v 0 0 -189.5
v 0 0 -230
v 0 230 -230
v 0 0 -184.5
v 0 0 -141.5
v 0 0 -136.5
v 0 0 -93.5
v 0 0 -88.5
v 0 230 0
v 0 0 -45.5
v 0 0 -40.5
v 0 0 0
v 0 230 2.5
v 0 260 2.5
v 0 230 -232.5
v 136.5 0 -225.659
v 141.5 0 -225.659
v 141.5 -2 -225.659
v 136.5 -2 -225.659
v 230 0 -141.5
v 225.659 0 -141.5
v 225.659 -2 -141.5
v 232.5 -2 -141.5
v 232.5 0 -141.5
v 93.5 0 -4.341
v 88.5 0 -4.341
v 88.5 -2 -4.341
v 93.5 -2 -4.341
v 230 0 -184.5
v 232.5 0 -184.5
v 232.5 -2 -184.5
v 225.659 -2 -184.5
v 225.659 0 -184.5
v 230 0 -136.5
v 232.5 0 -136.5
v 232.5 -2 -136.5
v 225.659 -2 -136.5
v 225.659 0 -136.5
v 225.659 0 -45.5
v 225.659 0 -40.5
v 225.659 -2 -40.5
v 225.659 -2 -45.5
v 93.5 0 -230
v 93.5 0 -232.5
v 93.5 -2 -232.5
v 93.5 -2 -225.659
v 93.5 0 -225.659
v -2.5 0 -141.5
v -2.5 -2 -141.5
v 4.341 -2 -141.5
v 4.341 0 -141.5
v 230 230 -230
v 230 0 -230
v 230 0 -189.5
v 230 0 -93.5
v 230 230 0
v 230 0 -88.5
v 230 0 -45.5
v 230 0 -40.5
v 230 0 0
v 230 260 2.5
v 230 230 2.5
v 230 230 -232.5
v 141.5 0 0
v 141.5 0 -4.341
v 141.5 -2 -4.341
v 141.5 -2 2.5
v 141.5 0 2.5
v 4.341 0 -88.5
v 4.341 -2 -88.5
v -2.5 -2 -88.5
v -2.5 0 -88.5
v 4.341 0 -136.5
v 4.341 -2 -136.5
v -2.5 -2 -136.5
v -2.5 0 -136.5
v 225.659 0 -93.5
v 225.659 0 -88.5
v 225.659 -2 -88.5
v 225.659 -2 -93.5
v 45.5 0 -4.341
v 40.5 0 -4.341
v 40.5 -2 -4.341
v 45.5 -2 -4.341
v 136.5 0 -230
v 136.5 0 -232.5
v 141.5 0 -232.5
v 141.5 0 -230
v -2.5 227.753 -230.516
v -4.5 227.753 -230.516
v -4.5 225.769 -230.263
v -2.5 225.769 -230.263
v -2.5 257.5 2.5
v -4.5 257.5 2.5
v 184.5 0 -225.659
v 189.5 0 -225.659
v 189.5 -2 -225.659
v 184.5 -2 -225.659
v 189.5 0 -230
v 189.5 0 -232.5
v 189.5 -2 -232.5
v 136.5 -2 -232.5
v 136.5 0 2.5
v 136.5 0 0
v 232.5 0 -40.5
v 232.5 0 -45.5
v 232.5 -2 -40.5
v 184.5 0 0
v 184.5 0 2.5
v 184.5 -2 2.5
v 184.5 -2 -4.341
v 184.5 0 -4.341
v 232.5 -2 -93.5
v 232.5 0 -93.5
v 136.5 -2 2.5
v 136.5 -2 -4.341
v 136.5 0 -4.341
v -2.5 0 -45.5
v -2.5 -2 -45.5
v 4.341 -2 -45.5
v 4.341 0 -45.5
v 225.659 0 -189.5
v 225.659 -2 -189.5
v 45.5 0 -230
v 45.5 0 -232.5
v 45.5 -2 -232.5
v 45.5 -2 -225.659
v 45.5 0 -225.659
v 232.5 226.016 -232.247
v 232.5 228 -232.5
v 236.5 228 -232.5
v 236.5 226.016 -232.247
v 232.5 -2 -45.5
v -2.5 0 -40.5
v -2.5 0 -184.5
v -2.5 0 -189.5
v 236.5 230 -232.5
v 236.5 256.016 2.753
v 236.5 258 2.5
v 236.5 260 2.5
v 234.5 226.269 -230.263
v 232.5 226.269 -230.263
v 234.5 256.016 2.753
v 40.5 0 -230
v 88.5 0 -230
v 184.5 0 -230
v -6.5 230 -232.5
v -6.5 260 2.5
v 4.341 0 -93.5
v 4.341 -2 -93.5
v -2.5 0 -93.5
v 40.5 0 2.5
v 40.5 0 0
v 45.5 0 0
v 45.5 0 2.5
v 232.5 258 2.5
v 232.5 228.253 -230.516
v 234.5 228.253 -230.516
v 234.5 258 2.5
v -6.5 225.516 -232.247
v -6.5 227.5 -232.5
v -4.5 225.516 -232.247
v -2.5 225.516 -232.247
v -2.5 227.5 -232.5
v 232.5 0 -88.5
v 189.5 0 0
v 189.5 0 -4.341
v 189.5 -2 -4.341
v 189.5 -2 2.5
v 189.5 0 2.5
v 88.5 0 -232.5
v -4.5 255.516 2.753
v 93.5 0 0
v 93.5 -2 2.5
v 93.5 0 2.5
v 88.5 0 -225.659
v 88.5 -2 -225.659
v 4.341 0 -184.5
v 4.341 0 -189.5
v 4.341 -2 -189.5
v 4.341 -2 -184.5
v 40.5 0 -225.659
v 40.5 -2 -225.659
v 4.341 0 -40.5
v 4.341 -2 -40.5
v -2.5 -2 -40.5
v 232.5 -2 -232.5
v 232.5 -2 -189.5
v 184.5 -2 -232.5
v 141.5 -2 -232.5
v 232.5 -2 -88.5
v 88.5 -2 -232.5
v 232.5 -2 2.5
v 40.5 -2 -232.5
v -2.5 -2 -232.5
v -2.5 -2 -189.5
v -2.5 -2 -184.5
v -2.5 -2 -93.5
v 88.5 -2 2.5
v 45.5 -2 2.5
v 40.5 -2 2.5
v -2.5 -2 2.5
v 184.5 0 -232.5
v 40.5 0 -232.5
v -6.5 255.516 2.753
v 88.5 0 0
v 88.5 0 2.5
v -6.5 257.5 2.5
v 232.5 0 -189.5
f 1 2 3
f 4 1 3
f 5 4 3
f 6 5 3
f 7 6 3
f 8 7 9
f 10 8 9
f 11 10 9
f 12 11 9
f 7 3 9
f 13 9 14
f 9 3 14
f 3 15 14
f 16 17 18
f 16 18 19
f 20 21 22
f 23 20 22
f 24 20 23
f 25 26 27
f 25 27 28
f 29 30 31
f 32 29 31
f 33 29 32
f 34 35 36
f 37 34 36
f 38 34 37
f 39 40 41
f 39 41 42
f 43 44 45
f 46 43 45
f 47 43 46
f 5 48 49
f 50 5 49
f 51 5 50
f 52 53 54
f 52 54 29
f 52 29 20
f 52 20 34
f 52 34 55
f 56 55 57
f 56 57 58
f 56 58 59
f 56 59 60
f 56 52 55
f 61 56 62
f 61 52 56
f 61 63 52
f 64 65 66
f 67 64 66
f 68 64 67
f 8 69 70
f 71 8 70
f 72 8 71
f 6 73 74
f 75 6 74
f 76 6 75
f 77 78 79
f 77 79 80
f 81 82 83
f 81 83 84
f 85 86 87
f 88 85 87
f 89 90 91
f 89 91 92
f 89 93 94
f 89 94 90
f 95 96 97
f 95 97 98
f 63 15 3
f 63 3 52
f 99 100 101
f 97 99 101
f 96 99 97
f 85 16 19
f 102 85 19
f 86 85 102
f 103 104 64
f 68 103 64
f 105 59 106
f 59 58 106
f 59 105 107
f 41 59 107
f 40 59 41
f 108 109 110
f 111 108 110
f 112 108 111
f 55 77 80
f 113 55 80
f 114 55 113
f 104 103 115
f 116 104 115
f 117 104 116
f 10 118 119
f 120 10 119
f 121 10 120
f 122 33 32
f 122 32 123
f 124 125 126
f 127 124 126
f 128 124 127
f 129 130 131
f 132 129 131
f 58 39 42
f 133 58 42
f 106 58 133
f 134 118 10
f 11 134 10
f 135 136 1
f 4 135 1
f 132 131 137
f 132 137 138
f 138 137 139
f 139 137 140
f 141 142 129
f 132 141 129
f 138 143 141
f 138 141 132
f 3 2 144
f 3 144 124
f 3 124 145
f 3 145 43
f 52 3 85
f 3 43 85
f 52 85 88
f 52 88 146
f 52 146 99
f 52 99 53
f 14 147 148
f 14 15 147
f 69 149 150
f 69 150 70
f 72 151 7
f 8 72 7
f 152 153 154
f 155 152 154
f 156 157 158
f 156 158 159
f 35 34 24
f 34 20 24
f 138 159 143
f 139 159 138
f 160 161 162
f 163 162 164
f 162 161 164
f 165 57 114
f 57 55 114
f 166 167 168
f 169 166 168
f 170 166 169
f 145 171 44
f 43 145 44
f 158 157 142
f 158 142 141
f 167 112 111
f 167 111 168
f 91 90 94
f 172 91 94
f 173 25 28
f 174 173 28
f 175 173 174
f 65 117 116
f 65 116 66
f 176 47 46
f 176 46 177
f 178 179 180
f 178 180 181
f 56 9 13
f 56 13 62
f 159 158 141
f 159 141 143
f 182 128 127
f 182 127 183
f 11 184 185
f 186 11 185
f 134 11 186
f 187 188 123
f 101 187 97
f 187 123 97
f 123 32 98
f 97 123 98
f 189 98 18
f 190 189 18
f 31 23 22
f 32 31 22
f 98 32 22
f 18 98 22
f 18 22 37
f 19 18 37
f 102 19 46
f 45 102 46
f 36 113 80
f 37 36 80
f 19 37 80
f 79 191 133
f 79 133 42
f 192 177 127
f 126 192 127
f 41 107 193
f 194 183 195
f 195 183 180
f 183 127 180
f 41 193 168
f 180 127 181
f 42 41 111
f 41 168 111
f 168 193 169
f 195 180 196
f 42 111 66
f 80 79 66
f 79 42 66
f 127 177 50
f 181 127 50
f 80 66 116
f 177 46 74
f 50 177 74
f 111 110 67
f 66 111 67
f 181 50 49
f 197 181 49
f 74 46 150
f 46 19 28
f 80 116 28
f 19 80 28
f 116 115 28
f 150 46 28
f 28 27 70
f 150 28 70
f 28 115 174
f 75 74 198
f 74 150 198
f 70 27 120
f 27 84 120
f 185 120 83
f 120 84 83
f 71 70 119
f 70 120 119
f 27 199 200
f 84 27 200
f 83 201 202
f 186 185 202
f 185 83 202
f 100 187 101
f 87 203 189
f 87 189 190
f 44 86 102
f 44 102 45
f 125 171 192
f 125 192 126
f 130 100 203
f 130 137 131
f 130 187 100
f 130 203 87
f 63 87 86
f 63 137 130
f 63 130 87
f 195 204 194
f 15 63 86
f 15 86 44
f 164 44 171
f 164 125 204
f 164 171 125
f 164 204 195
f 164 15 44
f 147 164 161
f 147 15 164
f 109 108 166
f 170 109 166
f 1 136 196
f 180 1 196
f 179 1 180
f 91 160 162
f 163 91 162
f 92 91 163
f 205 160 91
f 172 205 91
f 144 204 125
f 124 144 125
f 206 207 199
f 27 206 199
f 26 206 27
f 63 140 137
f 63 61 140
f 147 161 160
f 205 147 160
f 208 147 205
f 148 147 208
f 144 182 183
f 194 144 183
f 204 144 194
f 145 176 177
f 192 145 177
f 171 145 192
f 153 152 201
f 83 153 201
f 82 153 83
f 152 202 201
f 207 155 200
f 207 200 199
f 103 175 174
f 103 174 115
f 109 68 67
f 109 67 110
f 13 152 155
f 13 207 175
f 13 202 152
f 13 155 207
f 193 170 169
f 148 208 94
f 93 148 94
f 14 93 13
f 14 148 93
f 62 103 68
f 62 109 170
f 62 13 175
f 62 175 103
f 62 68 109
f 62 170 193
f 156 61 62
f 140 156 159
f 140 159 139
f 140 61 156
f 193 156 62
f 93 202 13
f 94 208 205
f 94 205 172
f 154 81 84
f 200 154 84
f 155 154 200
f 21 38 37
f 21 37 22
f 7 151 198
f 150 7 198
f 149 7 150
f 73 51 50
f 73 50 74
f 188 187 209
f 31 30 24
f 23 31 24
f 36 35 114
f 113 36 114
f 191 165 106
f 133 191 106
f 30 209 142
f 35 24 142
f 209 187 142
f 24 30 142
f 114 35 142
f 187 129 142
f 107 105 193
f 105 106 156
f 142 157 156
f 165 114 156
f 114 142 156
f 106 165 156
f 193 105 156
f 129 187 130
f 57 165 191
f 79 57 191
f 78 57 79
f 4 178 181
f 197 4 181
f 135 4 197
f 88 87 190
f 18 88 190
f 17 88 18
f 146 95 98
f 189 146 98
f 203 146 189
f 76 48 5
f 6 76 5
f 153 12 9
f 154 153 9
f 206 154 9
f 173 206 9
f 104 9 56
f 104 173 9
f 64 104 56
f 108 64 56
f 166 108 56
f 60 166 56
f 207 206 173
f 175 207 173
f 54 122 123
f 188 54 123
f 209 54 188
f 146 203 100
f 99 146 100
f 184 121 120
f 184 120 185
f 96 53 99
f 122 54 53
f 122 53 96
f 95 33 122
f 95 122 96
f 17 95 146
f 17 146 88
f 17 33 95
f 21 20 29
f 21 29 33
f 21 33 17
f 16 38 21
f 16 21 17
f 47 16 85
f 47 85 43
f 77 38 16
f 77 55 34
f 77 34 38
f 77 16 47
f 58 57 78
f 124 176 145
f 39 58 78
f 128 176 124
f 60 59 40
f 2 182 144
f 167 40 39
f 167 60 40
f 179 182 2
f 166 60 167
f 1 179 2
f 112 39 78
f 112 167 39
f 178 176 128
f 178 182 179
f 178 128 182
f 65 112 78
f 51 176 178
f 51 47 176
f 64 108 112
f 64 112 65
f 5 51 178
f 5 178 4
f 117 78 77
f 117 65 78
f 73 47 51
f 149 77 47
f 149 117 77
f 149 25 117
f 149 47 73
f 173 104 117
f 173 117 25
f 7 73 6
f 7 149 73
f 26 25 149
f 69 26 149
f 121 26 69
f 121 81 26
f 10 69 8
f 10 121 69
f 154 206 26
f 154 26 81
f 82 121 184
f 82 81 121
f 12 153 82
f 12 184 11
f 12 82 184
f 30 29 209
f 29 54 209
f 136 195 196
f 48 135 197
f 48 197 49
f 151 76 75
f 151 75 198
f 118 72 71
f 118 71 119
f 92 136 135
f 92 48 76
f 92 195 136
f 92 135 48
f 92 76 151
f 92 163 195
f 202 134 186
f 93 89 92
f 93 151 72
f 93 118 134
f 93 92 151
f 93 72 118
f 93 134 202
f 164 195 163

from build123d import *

# Parameters (mm, degrees)
SKETCH1_W            = 235
SKETCH1_H            = 235
SKETCH1_W_2          = 230
SKETCH1_H_2          = 230
EXTRUDE_THIN1_DEPTH  = 230
BOSS_EXTRUDE1_DEPTH  = 2.5
BOSS_EXTRUDE2_DEPTH  = 2.5
BOSS_EXTRUDE5_DEPTH  = 4
SKETCH8_W            = 2
SKETCH8_H            = 236.907154809
BOSS_EXTRUDE6_DEPTH  = 2
BOSS_EXTRUDE7_DEPTH  = 4
SKETCH10_W           = 2
SKETCH10_H           = 236.90715481
BOSS_EXTRUDE8_DEPTH  = 2
SKETCH11_W           = 2
SKETCH11_H           = 2
BOSS_EXTRUDE9_DEPTH  = 2
SKETCH12_W           = 2
SKETCH12_H           = 2
BOSS_EXTRUDE10_DEPTH = 2
BOSS_EXTRUDE11_DEPTH = 2


with BuildPart() as part:
    # Sketch1 → Extrude-Thin1 (new body)
    with BuildSketch(Plane(origin=(0, 0, 0), x_dir=(1, 0, 0), z_dir=(0, 1, 0))):
        with Locations((115, 115)):
            Rectangle(SKETCH1_W, SKETCH1_H)
        with Locations((115, 115)):
            Rectangle(SKETCH1_W_2, SKETCH1_H_2, mode=Mode.SUBTRACT)
    extrude(amount=EXTRUDE_THIN1_DEPTH)

    # Sketch4 → Boss-Extrude1 (add)
    with BuildSketch(Plane(origin=(232.5, 0, 0), x_dir=(0, 0, -1), z_dir=(1, 0, 0))):
        Polygon((-2.5, 230), (-2.5, 260), (232.5, 230), align=None)
    extrude(amount=-BOSS_EXTRUDE1_DEPTH)

    # Sketch5 → Boss-Extrude2 (add)
    with BuildSketch(Plane.ZY.offset(2.5)):
        Polygon((-232.5, 230), (2.5, 230), (2.5, 260), align=None)
    extrude(amount=-BOSS_EXTRUDE2_DEPTH)

    # Sketch6 → Boss-Extrude5 (add)
    with BuildSketch(Plane.ZY.offset(2.5)):
        Polygon((-232.5, 230), (2.5, 260), (2.5, 257.5), (-232.5, 227.5), align=None)
    extrude(amount=BOSS_EXTRUDE5_DEPTH)

    # Sketch8 → Boss-Extrude6 (add)
    with BuildSketch(Plane(origin=(0, 253.056792873, -32.305122494), x_dir=(1, 0, 0), z_dir=(0, -0.9919497796038491, 0.12663188675793835))):
        with Locations((-5.5, -83.365992116)):
            Rectangle(SKETCH8_W, SKETCH8_H)
    extrude(amount=BOSS_EXTRUDE6_DEPTH)

    # Sketch9 → Boss-Extrude7 (add)
    with BuildSketch(Plane(origin=(232.5, 0, 0), x_dir=(0, 0, -1), z_dir=(1, 0, 0))):
        Polygon((-2.5, 260), (232.5, 230), (232.5, 228), (-2.5, 258), align=None)
    extrude(amount=BOSS_EXTRUDE7_DEPTH)

    # Sketch10 → Boss-Extrude8 (add)
    with BuildSketch(Plane(origin=(0, 253.548775056, -32.367928731), x_dir=(1, 0, 0), z_dir=(0, -0.9919497796038491, 0.12663188675793827))):
        with Locations((235.5, -83.302676172)):
            Rectangle(SKETCH10_W, SKETCH10_H)
    extrude(amount=BOSS_EXTRUDE8_DEPTH)

    # Sketch11 → Boss-Extrude9 (add)
    with BuildSketch(Plane(origin=(0, 253.548775056, -32.367928731), x_dir=(1, 0, 0), z_dir=(0, -0.9919497796038491, 0.12663188675793827))):
        with Locations((233.5, -200.756253577)):
            Rectangle(SKETCH11_W, SKETCH11_H)
    extrude(amount=BOSS_EXTRUDE9_DEPTH)

    # Sketch12 → Boss-Extrude10 (add)
    with BuildSketch(Plane(origin=(0, 253.056792873, -32.305122494), x_dir=(1, 0, 0), z_dir=(0, -0.9919497796038491, 0.12663188675793835))):
        with Locations((-3.5, -200.81956952)):
            Rectangle(SKETCH12_W, SKETCH12_H)
    extrude(amount=BOSS_EXTRUDE10_DEPTH)

    # Sketch13 → Boss-Extrude11 (add)
    with BuildSketch(Plane.XZ):
        Polygon((-2.5, 2.5), (40.5, 2.5), (40.5, -4.341126342), (45.5, -4.341126342), (45.5, 2.5), (88.5, 2.5), (88.5, -4.341126342), (93.5, -4.341126342), (93.5, 2.5), (136.5, 2.5), (136.5, -4.341126342), (141.5, -4.341126342), (141.5, 2.5), (184.5, 2.5), (184.5, -4.341126342), (189.5, -4.341126342), (189.5, 2.5), (232.5, 2.5), (232.5, -40.5), (225.658873658, -40.5), (225.658873658, -45.5), (232.5, -45.5), (232.5, -88.5), (225.658873658, -88.5), (225.658873658, -93.5), (232.5, -93.5), (232.5, -136.5), (225.658873658, -136.5), (225.658873658, -141.5), (232.5, -141.5), (232.5, -184.5), (225.658873658, -184.5), (225.658873658, -189.5), (232.5, -189.5), (232.5, -232.5), (189.5, -232.5), (189.5, -225.658873658), (184.5, -225.658873658), (184.5, -232.5), (141.5, -232.5), (141.5, -225.658873658), (136.5, -225.658873658), (136.5, -232.5), (93.5, -232.5), (93.5, -225.658873658), (88.5, -225.658873658), (88.5, -232.5), (45.5, -232.5), (45.5, -225.658873658), (40.5, -225.658873658), (40.5, -232.5), (-2.5, -232.5), (-2.5, -189.5), (4.341126342, -189.5), (4.341126342, -184.5), (-2.5, -184.5), (-2.5, -141.5), (4.341126342, -141.5), (4.341126342, -136.5), (-2.5, -136.5), (-2.5, -93.5), (4.341126342, -93.5), (4.341126342, -88.5), (-2.5, -88.5), (-2.5, -45.5), (4.341126342, -45.5), (4.341126342, -40.5), (-2.5, -40.5), align=None)
    extrude(amount=BOSS_EXTRUDE11_DEPTH)


solid = part.part
